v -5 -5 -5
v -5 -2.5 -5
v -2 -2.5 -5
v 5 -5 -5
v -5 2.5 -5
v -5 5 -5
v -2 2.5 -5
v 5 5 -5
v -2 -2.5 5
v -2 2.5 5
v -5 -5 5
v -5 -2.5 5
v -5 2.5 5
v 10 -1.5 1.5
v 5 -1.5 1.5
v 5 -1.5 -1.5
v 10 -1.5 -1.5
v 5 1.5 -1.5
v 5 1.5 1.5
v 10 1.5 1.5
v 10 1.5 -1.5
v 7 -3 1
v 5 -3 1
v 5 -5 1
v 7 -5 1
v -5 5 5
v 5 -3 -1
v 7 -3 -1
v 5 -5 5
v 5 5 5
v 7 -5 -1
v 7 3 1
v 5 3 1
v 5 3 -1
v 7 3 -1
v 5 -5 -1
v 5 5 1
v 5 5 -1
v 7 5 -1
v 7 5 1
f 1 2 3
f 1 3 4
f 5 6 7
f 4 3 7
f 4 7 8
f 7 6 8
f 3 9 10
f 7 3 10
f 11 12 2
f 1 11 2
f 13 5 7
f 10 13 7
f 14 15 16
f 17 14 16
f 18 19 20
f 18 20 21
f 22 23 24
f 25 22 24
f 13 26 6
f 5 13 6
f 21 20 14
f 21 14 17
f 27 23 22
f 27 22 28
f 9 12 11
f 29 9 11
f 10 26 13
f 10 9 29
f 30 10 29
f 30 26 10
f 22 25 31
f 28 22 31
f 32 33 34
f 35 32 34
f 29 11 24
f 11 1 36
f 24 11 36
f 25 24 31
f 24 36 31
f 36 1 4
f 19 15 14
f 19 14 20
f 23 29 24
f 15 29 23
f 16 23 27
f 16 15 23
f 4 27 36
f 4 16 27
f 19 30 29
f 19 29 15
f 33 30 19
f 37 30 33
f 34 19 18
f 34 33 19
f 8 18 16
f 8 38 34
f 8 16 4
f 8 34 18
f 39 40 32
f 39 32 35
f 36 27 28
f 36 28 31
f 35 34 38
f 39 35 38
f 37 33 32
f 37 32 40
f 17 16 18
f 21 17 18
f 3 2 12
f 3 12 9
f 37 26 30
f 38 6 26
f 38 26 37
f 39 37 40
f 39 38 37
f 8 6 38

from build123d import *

# Parameters (mm, degrees)
SKETCH1_W           = 10
SKETCH1_H           = 10
BOSS_EXTRUDE1_DEPTH = 5
SKETCH2_W           = 3
SKETCH2_H           = 5
CUT_EXTRUDE1_DEPTH  = 13.247448714
SKETCH3_W           = 3
SKETCH3_H           = 3
BOSS_EXTRUDE2_DEPTH = 5
SKETCH4_W           = 2
SKETCH4_H           = 2
BOSS_EXTRUDE3_DEPTH = 2


with BuildPart() as part:
    # Sketch1 → Boss-Extrude1 (new, symmetric)
    with BuildSketch(Plane(origin=(0, 0, 0), x_dir=(1, 0, 0), z_dir=(0, 1, 0))):
        Rectangle(SKETCH1_W, SKETCH1_H)
    extrude(amount=BOSS_EXTRUDE1_DEPTH, both=True)

    # Sketch2 → Cut-Extrude1 (cut, through all)
    with BuildSketch(Plane.XY.offset(5)):
        with Locations((-3.5, 0)):
            Rectangle(SKETCH2_W, SKETCH2_H)
    extrude(amount=-CUT_EXTRUDE1_DEPTH, mode=Mode.SUBTRACT)

    # Sketch3 → Boss-Extrude2 (add)
    with BuildSketch(Plane(origin=(5, 0, 0), x_dir=(0, 0, -1), z_dir=(1, 0, 0))):
        Rectangle(SKETCH3_W, SKETCH3_H)
    extrude(amount=BOSS_EXTRUDE2_DEPTH)

    # Sketch4 → Boss-Extrude3 (add)
    with BuildSketch(Plane(origin=(5, 0, 0), x_dir=(0, 0, -1), z_dir=(1, 0, 0))):
        with Locations((0, 4)):
            Rectangle(SKETCH4_W, SKETCH4_H)
    boss_extrude3 = extrude(amount=BOSS_EXTRUDE3_DEPTH)

    # Mirror1: Boss-Extrude3 across plane
    add(boss_extrude3.mirror(Plane.ZX))


solid = part.part
